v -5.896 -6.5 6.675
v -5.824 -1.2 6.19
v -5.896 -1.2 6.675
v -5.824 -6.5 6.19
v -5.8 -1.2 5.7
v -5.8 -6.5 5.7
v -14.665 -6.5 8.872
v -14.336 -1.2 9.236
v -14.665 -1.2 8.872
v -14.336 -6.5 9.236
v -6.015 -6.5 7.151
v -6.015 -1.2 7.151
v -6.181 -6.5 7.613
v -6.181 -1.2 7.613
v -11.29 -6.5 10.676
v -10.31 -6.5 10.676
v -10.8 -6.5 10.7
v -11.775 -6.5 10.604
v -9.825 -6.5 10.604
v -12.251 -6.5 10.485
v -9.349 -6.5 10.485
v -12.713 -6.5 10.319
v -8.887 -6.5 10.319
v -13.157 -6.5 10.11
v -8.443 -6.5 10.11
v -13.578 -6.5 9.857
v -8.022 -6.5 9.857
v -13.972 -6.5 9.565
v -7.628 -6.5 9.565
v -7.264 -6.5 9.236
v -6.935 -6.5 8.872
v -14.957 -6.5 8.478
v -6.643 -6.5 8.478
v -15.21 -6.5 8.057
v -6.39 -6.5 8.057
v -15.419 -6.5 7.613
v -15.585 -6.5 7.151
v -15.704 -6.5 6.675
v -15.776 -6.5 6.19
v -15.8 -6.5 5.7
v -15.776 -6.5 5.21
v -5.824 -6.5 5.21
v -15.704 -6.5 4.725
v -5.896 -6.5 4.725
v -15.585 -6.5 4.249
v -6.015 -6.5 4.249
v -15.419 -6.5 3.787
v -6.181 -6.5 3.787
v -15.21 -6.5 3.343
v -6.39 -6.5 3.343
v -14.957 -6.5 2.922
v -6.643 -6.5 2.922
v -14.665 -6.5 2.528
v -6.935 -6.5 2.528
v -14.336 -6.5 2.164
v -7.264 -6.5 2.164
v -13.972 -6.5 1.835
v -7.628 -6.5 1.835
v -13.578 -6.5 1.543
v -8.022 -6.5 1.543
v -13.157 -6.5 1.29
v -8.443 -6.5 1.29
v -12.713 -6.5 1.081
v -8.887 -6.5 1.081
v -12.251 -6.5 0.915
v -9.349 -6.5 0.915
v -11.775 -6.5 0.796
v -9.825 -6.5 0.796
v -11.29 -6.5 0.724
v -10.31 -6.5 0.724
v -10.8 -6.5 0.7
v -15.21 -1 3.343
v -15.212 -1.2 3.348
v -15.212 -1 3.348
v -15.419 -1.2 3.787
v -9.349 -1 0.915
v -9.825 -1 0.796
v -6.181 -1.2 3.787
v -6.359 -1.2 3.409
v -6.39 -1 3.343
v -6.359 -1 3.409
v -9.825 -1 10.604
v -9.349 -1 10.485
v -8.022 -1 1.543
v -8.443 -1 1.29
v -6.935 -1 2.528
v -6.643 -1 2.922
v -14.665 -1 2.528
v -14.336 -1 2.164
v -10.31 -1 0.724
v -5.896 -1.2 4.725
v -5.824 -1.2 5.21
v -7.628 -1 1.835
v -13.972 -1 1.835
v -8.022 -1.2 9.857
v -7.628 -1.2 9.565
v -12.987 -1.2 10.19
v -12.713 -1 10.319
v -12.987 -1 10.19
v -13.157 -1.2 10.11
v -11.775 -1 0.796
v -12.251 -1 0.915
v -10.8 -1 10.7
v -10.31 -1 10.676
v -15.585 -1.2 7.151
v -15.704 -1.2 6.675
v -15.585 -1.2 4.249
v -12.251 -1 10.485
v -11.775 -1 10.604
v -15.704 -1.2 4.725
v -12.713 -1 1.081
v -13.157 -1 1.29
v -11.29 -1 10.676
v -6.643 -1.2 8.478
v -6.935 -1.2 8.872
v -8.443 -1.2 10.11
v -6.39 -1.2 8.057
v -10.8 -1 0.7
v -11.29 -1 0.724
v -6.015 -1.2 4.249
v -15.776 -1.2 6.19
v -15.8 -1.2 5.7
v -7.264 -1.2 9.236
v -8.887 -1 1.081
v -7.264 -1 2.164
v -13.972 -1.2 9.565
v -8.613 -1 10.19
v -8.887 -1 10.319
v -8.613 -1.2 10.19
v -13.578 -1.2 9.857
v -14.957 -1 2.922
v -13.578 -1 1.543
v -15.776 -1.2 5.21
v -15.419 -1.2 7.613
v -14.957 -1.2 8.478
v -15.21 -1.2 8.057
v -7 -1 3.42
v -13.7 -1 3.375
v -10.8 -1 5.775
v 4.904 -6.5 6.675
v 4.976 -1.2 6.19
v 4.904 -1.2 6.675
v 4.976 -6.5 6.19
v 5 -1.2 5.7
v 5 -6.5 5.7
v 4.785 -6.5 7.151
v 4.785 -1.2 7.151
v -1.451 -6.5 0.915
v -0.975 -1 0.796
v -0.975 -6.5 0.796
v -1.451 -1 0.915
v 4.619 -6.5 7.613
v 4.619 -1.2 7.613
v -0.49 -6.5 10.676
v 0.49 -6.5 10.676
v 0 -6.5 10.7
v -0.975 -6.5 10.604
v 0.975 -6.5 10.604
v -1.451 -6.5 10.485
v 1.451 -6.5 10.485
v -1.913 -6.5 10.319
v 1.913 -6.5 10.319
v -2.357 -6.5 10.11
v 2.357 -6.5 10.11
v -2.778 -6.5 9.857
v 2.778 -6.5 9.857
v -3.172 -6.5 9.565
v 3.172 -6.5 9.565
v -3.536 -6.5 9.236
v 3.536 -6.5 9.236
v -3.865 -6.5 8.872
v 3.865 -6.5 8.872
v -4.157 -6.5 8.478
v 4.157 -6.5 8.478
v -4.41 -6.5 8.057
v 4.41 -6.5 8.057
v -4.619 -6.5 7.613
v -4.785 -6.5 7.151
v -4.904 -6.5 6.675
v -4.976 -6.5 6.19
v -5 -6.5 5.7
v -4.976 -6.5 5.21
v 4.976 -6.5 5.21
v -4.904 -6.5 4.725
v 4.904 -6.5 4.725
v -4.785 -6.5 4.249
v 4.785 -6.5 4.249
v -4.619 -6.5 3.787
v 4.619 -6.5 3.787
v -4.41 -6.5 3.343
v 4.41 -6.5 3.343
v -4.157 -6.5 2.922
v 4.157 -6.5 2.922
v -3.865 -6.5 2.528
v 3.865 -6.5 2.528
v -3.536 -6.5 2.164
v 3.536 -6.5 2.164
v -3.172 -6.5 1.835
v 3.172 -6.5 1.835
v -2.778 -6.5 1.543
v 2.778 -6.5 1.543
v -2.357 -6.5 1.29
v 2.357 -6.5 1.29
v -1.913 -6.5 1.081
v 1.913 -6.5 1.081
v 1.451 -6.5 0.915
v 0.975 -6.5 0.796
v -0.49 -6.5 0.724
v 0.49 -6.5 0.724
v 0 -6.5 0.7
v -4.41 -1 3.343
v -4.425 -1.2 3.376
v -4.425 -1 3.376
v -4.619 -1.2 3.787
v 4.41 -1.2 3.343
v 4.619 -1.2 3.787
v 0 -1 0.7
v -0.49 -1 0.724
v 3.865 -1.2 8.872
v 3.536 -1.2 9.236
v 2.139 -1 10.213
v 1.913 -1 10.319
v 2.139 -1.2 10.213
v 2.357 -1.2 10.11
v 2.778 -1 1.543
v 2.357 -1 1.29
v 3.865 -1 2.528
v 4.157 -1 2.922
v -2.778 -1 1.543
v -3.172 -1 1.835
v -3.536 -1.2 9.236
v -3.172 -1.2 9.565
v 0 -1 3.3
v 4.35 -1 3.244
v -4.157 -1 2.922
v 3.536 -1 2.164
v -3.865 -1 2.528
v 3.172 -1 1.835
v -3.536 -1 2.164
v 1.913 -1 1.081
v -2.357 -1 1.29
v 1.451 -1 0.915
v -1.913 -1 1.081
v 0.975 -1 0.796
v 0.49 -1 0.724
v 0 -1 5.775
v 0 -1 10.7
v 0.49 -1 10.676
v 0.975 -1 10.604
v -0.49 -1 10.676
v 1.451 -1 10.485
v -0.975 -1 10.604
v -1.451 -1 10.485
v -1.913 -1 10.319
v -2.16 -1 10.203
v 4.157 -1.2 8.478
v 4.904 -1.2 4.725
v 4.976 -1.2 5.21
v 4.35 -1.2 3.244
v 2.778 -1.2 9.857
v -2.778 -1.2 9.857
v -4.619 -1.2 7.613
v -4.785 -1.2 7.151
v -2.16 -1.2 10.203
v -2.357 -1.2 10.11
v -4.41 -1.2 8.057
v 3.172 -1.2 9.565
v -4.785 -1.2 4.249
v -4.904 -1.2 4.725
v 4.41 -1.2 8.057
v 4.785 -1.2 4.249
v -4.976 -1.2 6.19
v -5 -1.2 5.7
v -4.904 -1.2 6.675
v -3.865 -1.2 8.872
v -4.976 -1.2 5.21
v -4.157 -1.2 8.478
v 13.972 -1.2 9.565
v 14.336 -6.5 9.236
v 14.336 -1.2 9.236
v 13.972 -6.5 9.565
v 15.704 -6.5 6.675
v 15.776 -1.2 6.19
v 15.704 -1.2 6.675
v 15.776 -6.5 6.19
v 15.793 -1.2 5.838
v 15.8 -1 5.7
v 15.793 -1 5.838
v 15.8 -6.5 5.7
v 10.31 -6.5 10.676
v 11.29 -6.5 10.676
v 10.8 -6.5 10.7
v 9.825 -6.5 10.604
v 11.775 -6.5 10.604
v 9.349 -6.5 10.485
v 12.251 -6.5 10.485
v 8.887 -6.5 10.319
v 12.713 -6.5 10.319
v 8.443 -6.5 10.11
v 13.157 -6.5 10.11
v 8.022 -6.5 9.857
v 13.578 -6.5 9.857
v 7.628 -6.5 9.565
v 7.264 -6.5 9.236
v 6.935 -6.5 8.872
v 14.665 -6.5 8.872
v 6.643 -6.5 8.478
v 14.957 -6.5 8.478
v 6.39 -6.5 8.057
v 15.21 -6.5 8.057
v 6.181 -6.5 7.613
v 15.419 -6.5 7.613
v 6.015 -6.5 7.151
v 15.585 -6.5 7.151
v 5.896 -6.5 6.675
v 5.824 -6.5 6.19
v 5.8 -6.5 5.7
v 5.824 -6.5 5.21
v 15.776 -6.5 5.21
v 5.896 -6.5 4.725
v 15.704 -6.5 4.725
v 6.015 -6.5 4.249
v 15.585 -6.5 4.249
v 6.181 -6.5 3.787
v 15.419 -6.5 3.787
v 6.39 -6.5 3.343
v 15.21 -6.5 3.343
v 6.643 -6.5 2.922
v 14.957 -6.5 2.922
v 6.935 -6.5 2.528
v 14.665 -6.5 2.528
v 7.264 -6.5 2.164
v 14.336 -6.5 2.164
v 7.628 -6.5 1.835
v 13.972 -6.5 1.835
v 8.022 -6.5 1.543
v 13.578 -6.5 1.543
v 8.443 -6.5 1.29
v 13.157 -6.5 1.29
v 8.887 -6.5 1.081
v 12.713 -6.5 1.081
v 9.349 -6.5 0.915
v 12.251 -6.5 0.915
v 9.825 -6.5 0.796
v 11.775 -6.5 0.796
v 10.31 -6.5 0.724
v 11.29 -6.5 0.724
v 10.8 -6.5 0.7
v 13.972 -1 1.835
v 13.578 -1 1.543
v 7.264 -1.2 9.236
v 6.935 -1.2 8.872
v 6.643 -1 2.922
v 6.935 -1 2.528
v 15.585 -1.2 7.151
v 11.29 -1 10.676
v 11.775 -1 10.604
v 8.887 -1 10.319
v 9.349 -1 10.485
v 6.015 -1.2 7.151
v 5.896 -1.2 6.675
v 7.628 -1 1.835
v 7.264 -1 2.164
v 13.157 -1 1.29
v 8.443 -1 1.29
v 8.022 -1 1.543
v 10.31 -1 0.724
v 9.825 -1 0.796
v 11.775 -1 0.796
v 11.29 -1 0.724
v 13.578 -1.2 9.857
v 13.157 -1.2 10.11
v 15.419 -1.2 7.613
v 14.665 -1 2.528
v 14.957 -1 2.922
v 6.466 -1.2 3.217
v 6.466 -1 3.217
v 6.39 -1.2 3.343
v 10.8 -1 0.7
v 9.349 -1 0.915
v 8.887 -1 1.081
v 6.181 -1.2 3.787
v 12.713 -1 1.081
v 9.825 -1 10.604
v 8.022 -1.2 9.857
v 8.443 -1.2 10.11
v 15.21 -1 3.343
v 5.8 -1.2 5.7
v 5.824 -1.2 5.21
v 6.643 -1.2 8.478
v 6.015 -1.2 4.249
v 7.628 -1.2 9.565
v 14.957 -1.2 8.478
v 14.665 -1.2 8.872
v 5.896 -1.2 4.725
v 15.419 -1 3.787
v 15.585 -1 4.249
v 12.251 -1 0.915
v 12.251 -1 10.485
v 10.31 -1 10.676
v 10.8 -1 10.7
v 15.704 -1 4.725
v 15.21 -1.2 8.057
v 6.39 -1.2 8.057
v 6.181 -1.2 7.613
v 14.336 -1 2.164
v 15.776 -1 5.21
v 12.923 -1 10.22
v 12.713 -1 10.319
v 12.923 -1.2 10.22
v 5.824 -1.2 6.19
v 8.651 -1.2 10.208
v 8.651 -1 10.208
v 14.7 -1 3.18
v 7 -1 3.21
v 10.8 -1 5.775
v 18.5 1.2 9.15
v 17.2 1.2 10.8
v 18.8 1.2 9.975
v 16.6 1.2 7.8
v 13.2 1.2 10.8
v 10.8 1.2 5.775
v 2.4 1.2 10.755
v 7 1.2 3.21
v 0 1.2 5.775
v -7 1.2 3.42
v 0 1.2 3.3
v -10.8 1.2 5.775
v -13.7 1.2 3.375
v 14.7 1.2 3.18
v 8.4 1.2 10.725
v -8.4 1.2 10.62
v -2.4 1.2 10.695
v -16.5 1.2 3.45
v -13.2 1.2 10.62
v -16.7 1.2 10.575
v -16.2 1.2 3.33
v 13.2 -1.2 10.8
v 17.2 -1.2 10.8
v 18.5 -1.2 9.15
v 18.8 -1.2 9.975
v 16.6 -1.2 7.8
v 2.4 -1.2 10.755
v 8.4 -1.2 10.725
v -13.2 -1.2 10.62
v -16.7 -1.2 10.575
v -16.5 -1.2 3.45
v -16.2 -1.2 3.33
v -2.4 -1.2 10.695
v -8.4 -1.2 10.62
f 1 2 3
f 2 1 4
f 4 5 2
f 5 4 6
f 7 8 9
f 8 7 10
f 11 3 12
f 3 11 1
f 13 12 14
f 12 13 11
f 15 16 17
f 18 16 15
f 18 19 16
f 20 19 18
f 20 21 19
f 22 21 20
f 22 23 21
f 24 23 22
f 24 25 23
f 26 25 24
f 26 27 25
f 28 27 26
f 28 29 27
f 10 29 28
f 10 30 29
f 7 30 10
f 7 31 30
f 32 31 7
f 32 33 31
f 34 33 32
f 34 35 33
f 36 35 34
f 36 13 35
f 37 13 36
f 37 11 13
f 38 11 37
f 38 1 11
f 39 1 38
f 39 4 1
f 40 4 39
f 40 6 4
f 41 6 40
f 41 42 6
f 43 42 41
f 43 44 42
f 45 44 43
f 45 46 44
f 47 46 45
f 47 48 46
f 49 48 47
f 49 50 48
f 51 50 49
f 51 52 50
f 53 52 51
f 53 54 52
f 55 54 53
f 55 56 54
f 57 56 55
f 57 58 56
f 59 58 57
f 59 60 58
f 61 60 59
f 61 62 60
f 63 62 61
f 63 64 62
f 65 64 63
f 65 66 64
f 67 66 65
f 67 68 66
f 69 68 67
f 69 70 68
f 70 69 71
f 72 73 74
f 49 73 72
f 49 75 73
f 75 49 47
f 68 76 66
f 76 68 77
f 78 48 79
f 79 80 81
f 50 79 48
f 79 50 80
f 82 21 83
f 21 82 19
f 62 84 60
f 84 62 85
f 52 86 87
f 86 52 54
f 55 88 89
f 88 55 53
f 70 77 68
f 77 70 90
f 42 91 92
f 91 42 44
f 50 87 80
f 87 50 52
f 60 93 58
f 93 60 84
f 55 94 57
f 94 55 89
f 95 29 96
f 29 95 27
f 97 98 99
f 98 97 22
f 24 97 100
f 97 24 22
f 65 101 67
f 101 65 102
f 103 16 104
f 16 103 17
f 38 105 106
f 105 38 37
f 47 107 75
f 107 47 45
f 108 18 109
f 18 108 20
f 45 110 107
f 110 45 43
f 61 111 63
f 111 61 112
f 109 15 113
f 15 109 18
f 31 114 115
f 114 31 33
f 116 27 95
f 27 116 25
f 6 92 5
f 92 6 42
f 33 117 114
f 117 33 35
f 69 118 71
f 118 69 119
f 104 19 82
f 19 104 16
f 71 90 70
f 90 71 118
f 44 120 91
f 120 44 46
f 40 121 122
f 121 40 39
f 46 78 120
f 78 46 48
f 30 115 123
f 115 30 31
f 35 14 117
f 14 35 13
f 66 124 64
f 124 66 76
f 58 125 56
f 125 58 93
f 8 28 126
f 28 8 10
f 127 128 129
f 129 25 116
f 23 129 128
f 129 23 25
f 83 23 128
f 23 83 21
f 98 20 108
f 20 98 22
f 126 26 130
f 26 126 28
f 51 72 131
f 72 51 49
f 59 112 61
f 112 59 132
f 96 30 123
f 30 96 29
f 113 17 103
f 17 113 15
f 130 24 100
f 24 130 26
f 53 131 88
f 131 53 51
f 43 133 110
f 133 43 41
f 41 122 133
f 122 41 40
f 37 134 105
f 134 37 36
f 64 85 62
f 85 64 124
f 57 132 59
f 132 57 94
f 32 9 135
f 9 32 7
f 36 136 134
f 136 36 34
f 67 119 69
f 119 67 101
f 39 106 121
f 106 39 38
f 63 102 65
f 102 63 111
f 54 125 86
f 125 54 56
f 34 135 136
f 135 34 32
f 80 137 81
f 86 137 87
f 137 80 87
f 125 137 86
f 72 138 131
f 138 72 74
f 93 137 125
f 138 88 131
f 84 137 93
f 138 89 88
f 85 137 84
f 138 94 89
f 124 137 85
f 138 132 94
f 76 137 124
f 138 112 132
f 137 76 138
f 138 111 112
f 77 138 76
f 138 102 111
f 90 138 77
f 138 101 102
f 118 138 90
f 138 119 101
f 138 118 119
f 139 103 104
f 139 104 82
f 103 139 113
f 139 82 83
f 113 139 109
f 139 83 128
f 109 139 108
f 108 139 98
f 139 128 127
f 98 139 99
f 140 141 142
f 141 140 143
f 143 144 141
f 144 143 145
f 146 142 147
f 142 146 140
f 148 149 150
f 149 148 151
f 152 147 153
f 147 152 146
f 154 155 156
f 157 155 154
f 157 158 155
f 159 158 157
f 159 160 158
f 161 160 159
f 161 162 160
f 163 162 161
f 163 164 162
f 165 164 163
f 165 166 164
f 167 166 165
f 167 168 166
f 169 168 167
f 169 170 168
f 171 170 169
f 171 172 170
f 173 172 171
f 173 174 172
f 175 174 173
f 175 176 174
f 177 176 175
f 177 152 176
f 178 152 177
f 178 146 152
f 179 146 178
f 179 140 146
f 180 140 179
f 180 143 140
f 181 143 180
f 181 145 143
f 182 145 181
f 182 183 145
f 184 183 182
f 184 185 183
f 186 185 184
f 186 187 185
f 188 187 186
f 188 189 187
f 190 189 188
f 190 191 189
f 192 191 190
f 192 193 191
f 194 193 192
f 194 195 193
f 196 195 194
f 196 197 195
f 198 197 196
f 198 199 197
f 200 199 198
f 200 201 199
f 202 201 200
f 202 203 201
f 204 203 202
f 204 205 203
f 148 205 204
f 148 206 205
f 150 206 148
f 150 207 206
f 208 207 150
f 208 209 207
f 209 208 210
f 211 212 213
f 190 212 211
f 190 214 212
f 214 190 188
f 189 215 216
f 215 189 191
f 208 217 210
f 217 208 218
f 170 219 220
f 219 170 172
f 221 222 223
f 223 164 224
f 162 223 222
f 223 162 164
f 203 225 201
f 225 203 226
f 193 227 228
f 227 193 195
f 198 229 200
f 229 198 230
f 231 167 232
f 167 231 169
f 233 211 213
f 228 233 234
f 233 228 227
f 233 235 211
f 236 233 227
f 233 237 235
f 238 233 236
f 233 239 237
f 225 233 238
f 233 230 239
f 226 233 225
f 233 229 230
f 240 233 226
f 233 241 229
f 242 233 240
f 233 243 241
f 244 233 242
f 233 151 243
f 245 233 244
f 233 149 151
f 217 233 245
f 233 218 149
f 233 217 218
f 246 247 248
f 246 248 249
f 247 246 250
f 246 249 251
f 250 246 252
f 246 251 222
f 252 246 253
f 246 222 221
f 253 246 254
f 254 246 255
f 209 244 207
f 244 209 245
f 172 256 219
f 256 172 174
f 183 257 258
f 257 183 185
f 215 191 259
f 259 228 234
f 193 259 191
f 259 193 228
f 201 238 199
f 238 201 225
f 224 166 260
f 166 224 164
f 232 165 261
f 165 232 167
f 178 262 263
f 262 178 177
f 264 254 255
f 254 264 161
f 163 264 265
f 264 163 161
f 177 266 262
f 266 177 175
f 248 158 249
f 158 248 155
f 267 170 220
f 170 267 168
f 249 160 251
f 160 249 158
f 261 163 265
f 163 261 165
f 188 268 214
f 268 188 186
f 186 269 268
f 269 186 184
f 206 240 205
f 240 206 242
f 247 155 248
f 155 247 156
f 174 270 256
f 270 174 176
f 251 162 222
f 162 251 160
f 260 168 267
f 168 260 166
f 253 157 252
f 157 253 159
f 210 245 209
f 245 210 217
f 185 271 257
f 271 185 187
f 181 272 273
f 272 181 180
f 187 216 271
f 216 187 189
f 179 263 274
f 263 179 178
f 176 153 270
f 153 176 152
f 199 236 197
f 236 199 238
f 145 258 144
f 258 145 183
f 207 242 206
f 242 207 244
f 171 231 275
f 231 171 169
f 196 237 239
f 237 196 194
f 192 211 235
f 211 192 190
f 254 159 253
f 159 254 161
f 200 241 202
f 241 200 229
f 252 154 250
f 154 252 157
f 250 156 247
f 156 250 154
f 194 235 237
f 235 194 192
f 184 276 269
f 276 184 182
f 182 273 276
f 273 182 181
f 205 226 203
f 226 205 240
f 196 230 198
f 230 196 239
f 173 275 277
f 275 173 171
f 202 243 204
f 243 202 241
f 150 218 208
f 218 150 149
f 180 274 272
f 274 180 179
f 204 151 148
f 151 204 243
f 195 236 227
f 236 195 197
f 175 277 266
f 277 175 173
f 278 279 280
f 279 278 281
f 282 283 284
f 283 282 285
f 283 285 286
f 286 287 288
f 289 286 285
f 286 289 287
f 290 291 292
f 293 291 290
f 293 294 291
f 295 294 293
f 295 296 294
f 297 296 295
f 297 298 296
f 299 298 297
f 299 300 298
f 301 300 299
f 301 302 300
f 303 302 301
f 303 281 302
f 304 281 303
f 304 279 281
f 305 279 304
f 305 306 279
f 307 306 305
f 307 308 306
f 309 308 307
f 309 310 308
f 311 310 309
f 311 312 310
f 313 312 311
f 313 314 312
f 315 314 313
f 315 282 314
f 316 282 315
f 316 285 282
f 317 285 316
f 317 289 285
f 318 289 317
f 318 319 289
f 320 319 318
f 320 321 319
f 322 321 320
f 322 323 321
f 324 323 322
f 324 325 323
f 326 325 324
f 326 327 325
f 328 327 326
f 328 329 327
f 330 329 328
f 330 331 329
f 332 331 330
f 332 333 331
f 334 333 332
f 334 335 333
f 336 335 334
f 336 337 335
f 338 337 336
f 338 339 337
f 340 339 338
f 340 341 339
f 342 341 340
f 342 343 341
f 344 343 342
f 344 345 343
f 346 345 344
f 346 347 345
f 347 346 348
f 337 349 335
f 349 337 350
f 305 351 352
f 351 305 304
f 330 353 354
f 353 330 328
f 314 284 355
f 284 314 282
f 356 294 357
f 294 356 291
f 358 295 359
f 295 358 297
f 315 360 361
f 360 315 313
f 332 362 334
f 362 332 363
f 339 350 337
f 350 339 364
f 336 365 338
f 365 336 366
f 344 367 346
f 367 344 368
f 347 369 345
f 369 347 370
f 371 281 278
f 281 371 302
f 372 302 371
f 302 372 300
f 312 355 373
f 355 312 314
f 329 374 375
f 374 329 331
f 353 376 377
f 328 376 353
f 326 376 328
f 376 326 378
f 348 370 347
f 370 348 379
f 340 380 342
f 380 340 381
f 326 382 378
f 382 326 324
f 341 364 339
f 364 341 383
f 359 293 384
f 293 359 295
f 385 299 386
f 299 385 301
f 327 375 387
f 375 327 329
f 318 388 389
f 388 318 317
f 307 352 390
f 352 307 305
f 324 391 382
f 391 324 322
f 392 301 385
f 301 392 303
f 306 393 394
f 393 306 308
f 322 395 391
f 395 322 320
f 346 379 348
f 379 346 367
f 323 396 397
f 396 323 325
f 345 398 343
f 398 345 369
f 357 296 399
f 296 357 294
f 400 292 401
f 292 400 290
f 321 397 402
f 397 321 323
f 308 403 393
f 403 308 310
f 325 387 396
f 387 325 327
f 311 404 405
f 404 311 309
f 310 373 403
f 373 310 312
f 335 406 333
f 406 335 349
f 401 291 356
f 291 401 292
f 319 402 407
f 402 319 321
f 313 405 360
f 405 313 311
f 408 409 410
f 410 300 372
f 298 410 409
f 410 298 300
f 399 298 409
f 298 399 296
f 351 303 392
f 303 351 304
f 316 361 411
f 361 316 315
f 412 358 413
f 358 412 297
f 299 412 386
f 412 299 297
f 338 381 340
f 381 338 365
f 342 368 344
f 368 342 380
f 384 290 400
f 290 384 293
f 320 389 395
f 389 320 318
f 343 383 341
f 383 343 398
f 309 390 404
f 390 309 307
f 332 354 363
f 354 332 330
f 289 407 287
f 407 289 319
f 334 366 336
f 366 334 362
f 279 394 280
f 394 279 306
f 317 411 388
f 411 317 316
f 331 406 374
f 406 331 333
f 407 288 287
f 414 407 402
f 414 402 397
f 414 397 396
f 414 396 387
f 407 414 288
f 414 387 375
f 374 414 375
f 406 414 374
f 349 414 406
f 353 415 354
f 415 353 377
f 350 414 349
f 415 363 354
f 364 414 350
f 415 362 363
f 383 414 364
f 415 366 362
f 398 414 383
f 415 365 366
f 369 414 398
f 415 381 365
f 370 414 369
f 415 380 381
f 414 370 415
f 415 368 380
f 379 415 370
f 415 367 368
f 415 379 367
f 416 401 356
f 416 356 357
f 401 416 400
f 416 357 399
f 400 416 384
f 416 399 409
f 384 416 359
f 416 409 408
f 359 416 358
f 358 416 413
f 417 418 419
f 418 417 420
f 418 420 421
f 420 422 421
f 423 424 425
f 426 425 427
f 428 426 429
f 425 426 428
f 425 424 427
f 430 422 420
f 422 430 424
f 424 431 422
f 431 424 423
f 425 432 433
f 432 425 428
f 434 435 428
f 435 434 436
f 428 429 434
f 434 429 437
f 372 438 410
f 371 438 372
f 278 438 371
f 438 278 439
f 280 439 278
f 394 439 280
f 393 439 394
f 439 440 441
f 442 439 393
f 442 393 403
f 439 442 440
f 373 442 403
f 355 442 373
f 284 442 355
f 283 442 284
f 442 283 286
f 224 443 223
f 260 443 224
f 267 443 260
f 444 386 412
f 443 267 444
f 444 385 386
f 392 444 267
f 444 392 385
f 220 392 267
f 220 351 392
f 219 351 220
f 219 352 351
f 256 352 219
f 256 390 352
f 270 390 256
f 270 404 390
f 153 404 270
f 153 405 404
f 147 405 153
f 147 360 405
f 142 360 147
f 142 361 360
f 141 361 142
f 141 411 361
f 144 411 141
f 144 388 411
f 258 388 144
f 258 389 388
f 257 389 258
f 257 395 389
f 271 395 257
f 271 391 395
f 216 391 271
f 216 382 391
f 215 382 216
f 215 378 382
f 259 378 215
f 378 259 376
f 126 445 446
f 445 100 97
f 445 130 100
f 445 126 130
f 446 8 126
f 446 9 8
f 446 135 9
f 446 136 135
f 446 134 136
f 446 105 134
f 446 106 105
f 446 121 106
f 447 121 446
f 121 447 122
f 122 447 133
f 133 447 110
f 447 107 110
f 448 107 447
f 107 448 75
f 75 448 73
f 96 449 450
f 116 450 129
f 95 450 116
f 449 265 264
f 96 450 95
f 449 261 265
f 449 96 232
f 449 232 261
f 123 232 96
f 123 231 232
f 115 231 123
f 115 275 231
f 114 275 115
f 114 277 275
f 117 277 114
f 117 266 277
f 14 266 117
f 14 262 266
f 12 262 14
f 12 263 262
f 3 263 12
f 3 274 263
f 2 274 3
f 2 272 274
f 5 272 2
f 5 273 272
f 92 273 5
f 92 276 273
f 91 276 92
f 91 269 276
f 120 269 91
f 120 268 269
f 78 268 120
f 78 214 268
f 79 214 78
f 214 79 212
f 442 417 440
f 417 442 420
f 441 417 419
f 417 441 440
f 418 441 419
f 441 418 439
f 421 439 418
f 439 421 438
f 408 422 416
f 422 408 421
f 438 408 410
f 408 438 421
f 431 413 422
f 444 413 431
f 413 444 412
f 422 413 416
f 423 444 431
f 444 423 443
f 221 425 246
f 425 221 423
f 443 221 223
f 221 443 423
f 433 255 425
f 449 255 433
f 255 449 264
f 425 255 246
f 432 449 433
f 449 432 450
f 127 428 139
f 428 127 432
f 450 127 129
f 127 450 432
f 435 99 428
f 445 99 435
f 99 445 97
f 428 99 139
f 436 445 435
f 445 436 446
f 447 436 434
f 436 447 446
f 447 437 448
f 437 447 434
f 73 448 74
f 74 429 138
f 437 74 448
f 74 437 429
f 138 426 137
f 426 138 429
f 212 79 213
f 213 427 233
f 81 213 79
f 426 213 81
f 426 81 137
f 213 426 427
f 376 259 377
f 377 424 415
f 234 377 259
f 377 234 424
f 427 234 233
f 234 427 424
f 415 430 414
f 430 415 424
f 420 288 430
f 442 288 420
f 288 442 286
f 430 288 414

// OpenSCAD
/*
  Matchbox/Mattel ATV 6x6 - current white bathtub side profile.
  Units: millimeters.

  This is a side-profile alignment pass, not the final 3D bathtub.

  Logic:
    - wheels are dropped into open pockets from above;
    - the side wall is one continuous bathtub wall, not separate holes;
    - each pocket is a sharp V-like axle seat in the top edge;
    - the lower edge stays continuous so the part reads as one tub.
*/

$fn = 64;

show_preview_wheels = true;

wheel_diameter = 10.0;
wheel_width = 5.5;
profile_thickness = 2.4;
profile_z_scale = 1.50;
pocket_floor_z = 3.85;
wheel_center_z = 3.80;
top_z_rear = 7.05;
top_z_front = 7.20;
bottom_z_rear = 2.30;
bottom_z_front = 2.12;

wheel_x = [-10.8, 0.0, 10.8];
wheel_z = wheel_center_z * profile_z_scale;

module side_profile_2d() {
    scale([1, profile_z_scale])
        polygon(points=[
            // shorter feedback6 profile: close wheels, straight upper cut, sharp V pockets
            [-16.5, bottom_z_rear],
            [-16.7, top_z_rear],
            [-13.2, top_z_rear + 0.03],
            [-10.8, pocket_floor_z],
            [ -8.4, top_z_rear + 0.03],

            [ -2.4, top_z_rear + 0.08],
            [  0.0, pocket_floor_z],
            [  2.4, top_z_rear + 0.12],

            [  8.4, top_z_front - 0.05],
            [ 10.8, pocket_floor_z],
            [ 13.2, top_z_front],

            // compact front/right end: only a short nose after the third wheel
            [ 17.2, top_z_front],
            [ 18.8, top_z_front - 0.55],
            [ 18.5, top_z_front - 1.10],
            [ 16.6, top_z_front - 2.00],
            [ 14.7, bottom_z_front],

            // short straight lower cut
            [  7.0, bottom_z_front + 0.02],
            [  0.0, bottom_z_front + 0.08],
            [ -7.0, bottom_z_rear - 0.02],
            [-13.7, bottom_z_rear - 0.05],
            [-16.2, bottom_z_rear - 0.08],
        ]);
}

module profile_plate() {
    rotate([90, 0, 0])
        linear_extrude(height = profile_thickness, center = true)
            side_profile_2d();
}

module preview_wheel(xpos) {
    color([0.96, 0.96, 0.90, 0.42])
        translate([xpos, -wheel_width / 2 - 1.0, wheel_z])
            rotate([90, 0, 0])
                cylinder(h = wheel_width, d = wheel_diameter, center = true);
}

color("white")
    profile_plate();

if (show_preview_wheels)
    for (xpos = wheel_x)
        preview_wheel(xpos);
